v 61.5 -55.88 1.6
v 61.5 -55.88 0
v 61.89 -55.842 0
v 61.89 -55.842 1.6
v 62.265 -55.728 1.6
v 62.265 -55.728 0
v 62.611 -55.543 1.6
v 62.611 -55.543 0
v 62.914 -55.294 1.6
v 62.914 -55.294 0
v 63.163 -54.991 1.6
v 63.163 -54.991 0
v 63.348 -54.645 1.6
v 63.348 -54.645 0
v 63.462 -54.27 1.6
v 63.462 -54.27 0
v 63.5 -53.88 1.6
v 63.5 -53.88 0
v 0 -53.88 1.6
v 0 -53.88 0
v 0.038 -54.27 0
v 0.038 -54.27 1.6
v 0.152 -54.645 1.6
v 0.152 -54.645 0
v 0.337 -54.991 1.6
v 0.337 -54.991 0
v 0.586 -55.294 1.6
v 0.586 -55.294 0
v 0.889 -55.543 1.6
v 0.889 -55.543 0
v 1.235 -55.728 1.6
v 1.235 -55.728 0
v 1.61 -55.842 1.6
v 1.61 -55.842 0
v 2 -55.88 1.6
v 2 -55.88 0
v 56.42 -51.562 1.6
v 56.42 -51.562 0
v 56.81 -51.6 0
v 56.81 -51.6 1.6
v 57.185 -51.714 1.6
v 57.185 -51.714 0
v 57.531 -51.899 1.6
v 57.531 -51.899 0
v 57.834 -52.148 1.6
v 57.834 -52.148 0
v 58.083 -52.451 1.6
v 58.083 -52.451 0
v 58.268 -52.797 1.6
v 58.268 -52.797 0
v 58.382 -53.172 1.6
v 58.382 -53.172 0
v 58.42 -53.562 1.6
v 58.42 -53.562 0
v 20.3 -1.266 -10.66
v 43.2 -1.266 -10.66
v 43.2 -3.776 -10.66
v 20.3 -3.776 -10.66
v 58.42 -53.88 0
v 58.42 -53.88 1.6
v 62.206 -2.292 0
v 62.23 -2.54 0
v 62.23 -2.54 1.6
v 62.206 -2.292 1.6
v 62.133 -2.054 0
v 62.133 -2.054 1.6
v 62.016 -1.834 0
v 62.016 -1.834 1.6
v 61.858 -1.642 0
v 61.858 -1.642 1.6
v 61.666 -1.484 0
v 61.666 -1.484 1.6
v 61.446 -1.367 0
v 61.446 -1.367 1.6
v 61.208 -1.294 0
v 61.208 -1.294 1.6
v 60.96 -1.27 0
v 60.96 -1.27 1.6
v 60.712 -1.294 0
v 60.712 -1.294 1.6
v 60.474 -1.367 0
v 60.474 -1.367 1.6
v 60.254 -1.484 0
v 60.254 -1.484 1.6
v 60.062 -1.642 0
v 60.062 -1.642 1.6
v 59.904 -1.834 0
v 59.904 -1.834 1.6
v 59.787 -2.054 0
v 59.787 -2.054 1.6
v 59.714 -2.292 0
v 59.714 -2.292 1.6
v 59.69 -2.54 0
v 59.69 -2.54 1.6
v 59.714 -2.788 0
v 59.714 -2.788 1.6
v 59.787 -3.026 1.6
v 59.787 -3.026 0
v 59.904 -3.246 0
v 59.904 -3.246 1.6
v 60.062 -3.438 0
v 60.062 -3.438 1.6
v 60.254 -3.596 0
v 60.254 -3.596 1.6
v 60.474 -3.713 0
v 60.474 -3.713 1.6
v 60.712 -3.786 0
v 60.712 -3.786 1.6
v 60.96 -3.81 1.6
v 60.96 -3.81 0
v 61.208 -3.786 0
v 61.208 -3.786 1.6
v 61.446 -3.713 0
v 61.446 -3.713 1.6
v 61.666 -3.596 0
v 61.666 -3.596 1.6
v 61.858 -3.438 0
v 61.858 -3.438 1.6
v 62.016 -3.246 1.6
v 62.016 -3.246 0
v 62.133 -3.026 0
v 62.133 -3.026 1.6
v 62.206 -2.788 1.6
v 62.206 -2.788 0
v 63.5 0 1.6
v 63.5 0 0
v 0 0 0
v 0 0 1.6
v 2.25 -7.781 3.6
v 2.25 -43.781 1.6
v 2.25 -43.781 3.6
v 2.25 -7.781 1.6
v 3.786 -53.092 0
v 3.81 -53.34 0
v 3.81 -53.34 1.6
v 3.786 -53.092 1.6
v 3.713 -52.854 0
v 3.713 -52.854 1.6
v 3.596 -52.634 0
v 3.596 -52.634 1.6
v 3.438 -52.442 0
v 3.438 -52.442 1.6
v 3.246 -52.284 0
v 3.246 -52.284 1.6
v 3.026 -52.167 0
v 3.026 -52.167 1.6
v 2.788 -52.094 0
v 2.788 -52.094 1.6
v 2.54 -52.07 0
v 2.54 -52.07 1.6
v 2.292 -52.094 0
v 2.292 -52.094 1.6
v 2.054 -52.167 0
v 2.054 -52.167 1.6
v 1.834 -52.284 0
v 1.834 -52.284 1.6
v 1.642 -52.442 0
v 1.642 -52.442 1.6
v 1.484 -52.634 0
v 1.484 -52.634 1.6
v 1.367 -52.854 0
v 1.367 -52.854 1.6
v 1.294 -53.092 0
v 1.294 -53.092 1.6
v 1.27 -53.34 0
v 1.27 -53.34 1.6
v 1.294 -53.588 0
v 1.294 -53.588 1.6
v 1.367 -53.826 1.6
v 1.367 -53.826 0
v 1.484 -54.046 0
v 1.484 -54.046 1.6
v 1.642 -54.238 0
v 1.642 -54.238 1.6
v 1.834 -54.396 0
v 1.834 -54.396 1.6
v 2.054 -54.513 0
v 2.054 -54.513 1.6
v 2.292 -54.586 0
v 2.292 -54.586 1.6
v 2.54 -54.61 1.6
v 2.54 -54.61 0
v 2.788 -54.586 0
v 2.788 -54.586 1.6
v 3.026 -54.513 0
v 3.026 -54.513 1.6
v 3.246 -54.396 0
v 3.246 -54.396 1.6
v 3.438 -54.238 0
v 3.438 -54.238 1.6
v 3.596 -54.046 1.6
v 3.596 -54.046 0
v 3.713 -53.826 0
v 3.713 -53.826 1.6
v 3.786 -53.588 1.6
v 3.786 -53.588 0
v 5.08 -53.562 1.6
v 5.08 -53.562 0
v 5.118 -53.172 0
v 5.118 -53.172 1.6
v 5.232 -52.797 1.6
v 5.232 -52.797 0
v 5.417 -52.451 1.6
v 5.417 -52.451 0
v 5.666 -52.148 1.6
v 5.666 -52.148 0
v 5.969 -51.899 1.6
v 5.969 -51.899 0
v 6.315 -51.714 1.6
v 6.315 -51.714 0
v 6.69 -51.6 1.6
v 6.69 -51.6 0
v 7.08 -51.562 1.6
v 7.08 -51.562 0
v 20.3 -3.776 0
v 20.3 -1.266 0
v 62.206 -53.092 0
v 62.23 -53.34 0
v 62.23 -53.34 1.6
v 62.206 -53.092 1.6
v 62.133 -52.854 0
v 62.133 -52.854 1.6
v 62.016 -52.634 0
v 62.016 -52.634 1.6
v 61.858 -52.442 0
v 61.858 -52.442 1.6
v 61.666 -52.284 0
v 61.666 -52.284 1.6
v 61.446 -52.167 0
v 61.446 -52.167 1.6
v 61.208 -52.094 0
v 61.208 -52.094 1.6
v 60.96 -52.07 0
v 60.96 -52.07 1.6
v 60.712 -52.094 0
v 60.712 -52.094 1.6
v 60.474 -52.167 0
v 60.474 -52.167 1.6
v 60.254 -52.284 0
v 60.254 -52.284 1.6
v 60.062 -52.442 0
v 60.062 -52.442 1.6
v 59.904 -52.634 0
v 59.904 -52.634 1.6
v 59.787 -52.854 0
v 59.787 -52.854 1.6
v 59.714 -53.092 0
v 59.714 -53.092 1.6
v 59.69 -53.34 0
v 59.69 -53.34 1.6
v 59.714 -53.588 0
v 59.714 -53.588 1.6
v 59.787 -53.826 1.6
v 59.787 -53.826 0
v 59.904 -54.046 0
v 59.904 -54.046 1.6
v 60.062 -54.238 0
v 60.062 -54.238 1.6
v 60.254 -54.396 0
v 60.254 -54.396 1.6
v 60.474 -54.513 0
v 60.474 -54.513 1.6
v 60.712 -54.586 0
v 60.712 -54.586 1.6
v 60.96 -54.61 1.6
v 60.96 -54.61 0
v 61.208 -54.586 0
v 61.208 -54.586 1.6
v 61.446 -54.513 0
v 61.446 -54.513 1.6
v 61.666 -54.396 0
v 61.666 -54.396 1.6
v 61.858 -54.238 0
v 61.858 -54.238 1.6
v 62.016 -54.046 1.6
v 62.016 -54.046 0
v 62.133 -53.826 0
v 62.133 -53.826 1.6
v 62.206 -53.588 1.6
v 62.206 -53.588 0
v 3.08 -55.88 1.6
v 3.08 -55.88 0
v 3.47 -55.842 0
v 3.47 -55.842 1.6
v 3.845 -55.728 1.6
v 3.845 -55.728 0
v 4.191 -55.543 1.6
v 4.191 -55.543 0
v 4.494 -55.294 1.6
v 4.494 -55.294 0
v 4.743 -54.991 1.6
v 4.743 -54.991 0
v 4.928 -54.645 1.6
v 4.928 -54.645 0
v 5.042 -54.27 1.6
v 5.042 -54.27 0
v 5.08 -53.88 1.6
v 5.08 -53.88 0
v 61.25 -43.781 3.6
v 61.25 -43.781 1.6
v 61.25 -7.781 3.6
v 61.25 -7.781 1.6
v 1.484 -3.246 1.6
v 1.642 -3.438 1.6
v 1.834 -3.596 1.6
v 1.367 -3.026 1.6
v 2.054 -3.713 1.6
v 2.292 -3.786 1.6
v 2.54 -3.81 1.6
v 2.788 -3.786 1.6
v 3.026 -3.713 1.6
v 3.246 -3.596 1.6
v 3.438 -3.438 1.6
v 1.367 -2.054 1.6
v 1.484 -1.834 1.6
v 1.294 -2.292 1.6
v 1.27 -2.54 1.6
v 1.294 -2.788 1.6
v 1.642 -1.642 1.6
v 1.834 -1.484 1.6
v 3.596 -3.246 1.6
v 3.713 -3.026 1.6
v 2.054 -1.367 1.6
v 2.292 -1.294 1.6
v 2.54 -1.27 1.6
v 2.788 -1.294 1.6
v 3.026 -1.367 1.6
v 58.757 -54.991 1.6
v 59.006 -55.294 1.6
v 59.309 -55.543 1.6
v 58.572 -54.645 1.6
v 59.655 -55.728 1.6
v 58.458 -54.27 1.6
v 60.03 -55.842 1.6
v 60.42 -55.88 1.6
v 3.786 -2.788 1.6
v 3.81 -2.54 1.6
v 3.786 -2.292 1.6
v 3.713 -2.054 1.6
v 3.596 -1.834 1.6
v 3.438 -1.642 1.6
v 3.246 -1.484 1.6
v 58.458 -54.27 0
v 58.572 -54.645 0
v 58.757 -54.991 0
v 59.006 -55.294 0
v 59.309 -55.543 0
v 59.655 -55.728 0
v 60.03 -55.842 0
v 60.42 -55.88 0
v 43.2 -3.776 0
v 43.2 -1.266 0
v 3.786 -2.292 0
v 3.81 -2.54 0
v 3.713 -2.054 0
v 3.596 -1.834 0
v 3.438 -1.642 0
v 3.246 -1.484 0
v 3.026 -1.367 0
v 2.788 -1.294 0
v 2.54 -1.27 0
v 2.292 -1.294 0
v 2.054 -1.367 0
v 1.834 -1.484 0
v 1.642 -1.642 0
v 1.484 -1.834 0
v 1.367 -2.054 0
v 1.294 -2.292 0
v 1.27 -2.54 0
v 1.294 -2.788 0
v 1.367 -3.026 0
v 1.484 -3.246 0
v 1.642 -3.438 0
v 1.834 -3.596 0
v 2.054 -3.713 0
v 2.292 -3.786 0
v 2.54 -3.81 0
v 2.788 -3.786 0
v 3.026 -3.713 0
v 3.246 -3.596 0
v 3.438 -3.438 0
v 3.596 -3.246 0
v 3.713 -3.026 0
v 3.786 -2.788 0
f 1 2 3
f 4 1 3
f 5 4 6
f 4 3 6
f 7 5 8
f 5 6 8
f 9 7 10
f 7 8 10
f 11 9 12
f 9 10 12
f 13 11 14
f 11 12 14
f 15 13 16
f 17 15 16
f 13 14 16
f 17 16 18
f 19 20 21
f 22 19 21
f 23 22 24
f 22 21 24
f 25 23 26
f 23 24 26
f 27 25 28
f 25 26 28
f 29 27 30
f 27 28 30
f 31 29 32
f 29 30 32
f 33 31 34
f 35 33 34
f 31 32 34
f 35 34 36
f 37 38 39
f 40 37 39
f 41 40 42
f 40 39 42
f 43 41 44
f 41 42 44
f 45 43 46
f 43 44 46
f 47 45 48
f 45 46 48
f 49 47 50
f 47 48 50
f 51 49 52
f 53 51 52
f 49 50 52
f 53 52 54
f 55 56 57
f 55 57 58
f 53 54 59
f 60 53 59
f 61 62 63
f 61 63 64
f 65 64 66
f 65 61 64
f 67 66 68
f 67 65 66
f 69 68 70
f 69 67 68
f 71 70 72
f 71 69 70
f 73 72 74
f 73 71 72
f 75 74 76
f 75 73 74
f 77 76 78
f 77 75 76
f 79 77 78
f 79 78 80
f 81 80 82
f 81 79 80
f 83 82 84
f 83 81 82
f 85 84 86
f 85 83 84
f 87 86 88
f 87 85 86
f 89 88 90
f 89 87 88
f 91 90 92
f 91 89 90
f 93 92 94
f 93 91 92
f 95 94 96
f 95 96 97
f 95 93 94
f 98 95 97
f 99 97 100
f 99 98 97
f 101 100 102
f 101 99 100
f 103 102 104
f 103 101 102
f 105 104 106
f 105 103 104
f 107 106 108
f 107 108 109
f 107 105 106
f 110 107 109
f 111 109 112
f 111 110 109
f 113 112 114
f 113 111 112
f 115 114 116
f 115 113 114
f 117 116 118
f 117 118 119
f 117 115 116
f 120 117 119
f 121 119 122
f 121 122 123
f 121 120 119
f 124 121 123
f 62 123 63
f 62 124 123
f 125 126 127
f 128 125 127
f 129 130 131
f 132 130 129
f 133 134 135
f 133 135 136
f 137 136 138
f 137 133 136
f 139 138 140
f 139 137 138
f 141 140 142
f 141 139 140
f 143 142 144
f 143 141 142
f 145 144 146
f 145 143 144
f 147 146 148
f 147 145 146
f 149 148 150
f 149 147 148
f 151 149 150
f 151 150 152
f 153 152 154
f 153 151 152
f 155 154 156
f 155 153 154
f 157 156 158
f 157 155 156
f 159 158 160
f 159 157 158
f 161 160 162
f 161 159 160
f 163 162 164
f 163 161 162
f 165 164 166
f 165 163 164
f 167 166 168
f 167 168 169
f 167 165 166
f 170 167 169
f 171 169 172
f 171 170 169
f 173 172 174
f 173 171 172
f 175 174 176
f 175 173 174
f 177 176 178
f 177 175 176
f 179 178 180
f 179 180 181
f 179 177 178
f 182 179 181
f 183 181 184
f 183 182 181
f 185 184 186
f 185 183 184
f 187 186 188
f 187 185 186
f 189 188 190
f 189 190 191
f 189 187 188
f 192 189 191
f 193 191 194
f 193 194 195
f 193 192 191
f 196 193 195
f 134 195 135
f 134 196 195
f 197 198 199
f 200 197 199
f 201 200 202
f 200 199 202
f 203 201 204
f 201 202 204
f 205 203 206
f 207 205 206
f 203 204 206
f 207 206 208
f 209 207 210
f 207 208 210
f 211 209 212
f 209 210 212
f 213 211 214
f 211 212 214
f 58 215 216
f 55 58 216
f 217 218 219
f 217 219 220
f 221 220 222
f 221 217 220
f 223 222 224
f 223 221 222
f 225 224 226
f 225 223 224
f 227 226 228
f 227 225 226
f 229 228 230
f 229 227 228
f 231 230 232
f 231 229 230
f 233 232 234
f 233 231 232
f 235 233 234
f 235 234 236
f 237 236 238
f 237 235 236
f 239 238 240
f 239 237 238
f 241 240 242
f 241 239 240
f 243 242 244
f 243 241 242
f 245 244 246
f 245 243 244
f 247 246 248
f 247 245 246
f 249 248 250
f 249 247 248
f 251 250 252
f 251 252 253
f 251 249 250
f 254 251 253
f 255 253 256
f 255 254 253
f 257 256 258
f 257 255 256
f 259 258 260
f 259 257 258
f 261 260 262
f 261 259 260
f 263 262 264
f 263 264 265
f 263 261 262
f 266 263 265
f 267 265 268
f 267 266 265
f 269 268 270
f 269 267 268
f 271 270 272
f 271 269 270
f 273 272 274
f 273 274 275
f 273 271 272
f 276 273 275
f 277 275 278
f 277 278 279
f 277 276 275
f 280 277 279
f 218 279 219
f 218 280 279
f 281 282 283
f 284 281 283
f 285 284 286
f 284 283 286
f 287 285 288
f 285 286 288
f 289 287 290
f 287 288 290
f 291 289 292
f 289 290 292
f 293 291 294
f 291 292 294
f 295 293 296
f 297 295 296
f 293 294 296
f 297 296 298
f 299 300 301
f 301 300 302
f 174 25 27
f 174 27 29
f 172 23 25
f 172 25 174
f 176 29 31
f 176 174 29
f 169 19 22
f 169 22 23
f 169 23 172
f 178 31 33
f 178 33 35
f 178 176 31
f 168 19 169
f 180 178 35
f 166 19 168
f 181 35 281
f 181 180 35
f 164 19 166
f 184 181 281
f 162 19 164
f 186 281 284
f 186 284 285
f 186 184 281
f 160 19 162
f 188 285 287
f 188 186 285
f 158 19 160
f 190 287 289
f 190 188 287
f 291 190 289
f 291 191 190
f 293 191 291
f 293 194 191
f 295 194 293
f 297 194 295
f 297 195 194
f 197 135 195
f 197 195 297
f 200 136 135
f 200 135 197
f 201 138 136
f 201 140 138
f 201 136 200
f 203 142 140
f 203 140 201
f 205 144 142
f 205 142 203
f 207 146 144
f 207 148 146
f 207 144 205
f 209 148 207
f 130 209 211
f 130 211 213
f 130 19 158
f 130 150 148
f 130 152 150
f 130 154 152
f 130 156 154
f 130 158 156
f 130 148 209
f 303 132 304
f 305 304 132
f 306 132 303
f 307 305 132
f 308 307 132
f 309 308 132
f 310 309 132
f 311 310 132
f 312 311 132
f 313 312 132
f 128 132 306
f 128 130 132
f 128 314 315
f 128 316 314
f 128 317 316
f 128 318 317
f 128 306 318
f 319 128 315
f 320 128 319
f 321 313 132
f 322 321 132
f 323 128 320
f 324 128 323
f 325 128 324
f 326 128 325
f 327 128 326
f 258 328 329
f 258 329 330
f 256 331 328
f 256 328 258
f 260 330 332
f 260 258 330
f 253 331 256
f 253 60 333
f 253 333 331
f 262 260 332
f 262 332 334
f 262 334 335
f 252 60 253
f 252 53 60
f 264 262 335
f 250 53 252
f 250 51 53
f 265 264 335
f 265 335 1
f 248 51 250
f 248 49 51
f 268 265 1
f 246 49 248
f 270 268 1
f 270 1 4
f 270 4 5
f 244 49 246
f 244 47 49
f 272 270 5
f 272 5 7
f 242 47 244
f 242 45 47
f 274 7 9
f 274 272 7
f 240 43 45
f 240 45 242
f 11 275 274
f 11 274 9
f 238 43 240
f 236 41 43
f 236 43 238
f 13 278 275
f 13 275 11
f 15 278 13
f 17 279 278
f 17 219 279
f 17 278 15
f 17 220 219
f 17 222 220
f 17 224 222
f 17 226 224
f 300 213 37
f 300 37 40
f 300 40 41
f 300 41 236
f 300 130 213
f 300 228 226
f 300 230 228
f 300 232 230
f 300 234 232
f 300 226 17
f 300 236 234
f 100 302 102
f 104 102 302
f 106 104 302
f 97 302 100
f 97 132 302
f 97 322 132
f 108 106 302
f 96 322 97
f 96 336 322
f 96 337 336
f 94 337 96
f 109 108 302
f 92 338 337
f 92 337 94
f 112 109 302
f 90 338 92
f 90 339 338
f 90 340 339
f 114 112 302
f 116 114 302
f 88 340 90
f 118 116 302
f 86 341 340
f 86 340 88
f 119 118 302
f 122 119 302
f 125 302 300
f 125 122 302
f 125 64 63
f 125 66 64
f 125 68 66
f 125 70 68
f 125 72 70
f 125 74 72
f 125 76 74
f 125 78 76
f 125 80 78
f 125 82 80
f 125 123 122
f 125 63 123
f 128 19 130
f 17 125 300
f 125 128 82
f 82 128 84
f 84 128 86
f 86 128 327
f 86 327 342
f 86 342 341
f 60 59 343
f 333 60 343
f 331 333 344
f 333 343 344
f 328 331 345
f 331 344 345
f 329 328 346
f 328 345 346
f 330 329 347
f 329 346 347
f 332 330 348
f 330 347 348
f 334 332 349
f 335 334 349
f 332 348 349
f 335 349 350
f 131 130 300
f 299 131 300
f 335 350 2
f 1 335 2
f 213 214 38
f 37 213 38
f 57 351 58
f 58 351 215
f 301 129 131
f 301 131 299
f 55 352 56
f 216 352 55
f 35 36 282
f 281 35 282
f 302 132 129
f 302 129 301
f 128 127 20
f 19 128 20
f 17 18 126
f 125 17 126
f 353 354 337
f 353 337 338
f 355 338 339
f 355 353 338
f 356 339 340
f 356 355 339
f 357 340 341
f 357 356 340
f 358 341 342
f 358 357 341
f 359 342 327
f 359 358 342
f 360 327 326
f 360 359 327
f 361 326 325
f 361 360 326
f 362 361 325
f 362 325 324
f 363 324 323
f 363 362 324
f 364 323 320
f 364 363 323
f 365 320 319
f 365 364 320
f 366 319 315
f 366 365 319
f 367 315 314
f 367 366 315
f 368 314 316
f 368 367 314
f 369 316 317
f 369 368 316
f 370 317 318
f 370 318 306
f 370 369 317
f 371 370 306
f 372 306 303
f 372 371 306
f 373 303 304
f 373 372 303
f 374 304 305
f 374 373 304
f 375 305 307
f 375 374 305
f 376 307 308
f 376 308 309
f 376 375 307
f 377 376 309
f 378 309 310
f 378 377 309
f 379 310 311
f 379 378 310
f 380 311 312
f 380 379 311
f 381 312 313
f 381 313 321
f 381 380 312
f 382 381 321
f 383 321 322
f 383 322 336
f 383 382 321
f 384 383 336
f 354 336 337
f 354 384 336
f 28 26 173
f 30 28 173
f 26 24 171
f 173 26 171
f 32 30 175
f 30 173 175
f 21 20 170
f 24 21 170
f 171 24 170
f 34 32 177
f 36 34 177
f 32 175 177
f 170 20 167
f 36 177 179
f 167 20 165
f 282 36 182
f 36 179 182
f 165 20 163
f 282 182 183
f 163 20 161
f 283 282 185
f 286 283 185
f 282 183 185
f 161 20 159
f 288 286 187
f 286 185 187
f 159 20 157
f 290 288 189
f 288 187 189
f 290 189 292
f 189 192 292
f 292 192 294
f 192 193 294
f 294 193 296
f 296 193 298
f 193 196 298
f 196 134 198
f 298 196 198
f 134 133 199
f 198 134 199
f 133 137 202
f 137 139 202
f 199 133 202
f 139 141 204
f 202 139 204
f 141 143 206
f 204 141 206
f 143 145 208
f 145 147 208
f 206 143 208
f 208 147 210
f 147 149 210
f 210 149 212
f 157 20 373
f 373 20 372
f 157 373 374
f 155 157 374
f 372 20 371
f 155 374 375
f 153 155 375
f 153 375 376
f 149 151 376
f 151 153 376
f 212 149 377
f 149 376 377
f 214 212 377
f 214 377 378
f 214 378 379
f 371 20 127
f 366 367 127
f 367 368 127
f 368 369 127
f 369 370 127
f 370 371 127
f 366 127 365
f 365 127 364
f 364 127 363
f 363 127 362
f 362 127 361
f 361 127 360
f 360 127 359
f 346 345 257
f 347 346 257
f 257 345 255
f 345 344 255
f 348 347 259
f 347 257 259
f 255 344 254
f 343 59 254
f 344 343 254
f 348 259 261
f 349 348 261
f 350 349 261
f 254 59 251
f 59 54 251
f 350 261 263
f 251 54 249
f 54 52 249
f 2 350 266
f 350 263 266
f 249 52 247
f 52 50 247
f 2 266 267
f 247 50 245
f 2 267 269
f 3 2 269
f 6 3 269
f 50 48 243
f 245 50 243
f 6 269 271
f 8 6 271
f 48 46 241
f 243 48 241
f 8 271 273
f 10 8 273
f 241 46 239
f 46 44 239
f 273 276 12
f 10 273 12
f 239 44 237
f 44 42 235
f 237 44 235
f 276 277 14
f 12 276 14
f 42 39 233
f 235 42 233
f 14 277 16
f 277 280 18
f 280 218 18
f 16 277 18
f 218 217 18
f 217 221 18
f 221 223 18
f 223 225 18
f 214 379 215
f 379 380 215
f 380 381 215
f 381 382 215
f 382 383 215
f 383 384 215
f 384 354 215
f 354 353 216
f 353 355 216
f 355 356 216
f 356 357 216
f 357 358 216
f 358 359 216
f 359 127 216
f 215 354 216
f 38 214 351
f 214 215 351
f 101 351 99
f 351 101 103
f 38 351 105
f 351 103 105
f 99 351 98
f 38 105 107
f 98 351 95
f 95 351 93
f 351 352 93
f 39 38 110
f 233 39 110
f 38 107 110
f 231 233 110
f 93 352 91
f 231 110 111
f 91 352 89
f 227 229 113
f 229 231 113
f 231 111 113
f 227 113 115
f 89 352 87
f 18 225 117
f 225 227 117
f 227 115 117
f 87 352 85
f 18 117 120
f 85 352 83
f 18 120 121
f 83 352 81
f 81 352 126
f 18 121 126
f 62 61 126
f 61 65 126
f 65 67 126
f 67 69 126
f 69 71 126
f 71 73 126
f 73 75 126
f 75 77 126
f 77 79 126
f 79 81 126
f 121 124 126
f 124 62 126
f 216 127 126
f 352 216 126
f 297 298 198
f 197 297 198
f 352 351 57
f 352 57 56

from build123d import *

# Parameters (mm, degrees)
SKETCH1_R           = 1.27
SKETCH1_W           = 59
SKETCH1_H           = 36
BOSS_EXTRUDE1_DEPTH = 1.6
SKETCH1_4_W         = 59
SKETCH1_4_H         = 36
BOSS_EXTRUDE2_DEPTH = 3.6
SKETCH2_W           = 22.9
SKETCH2_H           = 2.51
BOSS_EXTRUDE3_DEPTH = 10.66


with BuildPart() as part:
    # Sketch1 → Boss-Extrude1 (new body)
    # profile 1 of 2: a face of its own
    with BuildSketch(Plane.XY):
        with BuildLine():
            Line((0, 0), (0, -53.88))
            ThreePointArc((0, -53.88), (0.585786438, -55.294213562), (2, -55.88))
            Line((2, -55.88), (3.08, -55.88))
            ThreePointArc((3.08, -55.88), (4.494213562, -55.294213562), (5.08, -53.88))
            Line((5.08, -53.88), (5.08, -53.562))
            ThreePointArc((5.08, -53.562), (5.665786438, -52.147786438), (7.08, -51.562))
            Line((7.08, -51.562), (56.42, -51.562))
            ThreePointArc((56.42, -51.562), (57.834213562, -52.147786438), (58.42, -53.562))
            Line((58.42, -53.562), (58.42, -53.88))
            ThreePointArc((58.42, -53.88), (59.005786438, -55.294213562), (60.42, -55.88))
            Line((60.42, -55.88), (61.5, -55.88))
            ThreePointArc((61.5, -55.88), (62.914213562, -55.294213562), (63.5, -53.88))
            Line((63.5, -53.88), (63.5, 0))
            Line((63.5, 0), (0, 0))
        make_face()
        with Locations((2.54, -2.54)):
            Circle(SKETCH1_R, mode=Mode.SUBTRACT)
        with Locations((60.96, -2.54)):
            Circle(SKETCH1_R, mode=Mode.SUBTRACT)
        with Locations((60.96, -53.34)):
            Circle(SKETCH1_R, mode=Mode.SUBTRACT)
        with Locations((2.54, -53.34)):
            Circle(SKETCH1_R, mode=Mode.SUBTRACT)
        with Locations((31.75, -25.781)):
            Rectangle(SKETCH1_W, SKETCH1_H, mode=Mode.SUBTRACT)
    # profile 2 of 2: a face of its own
    with BuildSketch(Plane.XY):
        with Locations((31.75, -25.781)):
            Rectangle(SKETCH1_W, SKETCH1_H)
    extrude(amount=BOSS_EXTRUDE1_DEPTH)

    # Sketch1<4> → Boss-Extrude2 (add)
    with BuildSketch(Plane.XY):
        with Locations((31.75, -25.781)):
            Rectangle(SKETCH1_4_W, SKETCH1_4_H)
    extrude(amount=BOSS_EXTRUDE2_DEPTH)

    # Sketch2 → Boss-Extrude3 (add)
    with BuildSketch(Plane(origin=(0, 0, 0), x_dir=(-1, 0, 0), z_dir=(0, 0, -1))):
        with Locations((-31.75, -2.521379288)):
            Rectangle(SKETCH2_W, SKETCH2_H)
    extrude(amount=BOSS_EXTRUDE3_DEPTH)


solid = part.part
